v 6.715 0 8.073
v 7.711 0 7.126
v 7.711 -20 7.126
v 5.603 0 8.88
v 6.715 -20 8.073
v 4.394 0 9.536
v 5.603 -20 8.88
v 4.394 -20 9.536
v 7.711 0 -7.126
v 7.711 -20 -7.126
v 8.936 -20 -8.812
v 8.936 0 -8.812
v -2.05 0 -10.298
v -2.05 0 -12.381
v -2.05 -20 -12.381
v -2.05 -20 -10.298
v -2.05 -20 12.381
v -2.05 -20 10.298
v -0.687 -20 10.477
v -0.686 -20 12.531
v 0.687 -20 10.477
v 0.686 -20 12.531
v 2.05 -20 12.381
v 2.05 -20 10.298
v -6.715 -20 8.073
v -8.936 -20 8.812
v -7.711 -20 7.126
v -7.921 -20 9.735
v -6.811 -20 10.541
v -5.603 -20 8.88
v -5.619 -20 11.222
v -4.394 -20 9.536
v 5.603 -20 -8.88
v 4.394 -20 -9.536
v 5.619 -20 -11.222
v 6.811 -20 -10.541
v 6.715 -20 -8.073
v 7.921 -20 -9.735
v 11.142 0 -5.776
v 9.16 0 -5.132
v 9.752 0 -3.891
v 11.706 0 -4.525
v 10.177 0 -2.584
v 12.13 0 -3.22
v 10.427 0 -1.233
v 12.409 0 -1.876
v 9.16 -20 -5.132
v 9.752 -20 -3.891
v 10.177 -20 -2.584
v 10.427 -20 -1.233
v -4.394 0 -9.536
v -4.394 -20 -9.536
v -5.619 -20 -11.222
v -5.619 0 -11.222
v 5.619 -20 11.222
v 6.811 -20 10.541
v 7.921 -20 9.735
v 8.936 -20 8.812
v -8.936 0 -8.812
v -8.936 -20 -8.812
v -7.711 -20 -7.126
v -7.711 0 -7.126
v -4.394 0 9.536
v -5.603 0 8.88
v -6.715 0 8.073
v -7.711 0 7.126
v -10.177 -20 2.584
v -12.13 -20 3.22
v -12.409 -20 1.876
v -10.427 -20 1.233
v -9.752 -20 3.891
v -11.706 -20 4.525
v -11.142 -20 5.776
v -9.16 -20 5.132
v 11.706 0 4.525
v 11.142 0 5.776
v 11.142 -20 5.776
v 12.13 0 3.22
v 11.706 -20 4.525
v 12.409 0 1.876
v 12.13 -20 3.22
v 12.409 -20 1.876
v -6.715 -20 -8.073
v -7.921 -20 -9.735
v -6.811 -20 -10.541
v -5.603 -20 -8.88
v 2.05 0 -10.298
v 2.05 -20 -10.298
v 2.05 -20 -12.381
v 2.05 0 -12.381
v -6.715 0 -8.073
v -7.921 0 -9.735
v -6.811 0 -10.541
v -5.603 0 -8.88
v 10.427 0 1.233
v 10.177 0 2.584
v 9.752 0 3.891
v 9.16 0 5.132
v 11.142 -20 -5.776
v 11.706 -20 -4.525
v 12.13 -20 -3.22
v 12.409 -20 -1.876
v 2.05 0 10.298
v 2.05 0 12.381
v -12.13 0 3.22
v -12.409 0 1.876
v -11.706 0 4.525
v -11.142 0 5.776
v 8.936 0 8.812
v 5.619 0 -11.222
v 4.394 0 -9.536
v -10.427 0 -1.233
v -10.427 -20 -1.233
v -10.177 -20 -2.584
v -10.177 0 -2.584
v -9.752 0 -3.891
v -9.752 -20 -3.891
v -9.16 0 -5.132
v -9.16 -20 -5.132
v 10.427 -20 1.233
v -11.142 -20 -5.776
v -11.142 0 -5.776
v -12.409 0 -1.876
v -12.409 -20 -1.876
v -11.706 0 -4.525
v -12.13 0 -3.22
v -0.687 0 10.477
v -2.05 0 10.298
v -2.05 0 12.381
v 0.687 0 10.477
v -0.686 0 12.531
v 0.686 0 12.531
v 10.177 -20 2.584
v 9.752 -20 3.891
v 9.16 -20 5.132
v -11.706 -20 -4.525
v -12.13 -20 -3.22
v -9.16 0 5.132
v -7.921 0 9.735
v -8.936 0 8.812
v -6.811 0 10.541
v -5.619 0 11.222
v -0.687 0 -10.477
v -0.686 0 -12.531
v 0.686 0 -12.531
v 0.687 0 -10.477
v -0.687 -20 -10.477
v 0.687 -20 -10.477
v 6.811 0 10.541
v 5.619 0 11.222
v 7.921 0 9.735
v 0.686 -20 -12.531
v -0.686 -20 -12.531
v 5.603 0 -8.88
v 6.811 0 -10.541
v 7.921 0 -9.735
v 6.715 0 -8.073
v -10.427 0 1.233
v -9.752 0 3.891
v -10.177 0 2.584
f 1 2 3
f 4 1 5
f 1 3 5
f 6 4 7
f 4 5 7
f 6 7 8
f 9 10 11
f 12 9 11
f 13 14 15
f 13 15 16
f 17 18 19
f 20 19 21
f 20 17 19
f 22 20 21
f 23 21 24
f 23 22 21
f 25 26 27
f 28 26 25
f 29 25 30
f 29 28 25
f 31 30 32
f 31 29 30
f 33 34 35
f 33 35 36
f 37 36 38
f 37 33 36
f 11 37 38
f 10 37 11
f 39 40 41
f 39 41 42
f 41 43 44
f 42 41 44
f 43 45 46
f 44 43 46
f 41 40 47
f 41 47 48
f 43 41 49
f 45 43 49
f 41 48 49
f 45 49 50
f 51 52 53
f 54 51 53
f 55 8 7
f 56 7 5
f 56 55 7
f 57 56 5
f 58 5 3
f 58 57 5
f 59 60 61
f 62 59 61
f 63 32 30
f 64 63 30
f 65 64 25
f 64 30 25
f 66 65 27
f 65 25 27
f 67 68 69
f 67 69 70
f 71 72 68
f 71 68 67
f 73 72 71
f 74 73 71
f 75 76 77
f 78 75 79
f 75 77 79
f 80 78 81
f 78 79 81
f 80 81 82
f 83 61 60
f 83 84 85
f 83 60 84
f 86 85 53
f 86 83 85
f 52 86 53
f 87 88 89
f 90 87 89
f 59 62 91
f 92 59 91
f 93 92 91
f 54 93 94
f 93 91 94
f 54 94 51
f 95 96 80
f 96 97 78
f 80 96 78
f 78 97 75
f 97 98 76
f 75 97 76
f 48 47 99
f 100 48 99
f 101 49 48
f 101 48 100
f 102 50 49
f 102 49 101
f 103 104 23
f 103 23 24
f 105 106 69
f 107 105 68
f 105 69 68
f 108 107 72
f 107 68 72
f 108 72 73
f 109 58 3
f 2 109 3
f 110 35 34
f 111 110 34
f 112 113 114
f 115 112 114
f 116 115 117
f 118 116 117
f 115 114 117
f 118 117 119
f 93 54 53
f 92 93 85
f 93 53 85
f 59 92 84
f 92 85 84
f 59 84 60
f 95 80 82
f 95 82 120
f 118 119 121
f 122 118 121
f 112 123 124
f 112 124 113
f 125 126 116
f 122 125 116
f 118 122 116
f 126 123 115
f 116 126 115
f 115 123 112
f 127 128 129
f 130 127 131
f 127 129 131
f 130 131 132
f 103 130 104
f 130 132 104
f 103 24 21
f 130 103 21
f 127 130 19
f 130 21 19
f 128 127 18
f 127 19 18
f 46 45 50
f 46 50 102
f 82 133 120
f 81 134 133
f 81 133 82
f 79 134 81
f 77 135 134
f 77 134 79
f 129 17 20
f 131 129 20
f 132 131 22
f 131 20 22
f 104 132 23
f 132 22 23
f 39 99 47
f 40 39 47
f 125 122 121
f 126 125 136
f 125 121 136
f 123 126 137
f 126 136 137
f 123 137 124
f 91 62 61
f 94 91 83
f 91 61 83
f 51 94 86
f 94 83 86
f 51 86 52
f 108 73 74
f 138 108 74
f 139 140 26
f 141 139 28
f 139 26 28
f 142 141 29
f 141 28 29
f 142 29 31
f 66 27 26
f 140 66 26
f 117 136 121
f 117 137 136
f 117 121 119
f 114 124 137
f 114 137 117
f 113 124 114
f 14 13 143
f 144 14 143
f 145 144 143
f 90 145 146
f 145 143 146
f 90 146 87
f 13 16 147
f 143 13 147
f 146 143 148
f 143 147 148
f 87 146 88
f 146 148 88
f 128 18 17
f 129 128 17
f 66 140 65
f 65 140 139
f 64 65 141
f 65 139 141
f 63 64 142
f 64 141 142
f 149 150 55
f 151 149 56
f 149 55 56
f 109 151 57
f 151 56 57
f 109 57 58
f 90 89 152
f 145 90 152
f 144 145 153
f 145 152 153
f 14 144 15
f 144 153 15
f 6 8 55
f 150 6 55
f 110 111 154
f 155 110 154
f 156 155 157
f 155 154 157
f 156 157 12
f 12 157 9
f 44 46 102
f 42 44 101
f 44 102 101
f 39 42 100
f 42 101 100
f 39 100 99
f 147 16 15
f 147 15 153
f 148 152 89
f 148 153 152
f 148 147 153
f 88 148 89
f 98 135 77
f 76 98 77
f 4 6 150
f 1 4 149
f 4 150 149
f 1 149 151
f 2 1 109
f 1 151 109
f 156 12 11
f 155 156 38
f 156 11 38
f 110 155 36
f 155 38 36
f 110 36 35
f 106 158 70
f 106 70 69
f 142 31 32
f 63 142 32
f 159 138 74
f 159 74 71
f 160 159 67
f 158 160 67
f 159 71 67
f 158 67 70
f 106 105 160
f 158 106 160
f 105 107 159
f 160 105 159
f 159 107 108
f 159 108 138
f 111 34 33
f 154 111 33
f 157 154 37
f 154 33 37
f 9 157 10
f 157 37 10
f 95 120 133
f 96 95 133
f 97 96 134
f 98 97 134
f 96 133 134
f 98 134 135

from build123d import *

# Parameters (mm, degrees)
F1_DEPTH = 20
F3_DEPTH = 25


with BuildPart() as f1:
    # F0 (on Front) → F1 (new body)
    with BuildSketch(Plane.XZ):
        with BuildLine():
            ThreePointArc((48.729363, -11.200408), (49.681325, -5.636126), (50, 0))
            ThreePointArc((50, 0), (49.998301, 0.412138), (49.993206, 0.824248))
            ThreePointArc((49.993206, 0.824248), (49.726095, 5.226423), (49.072105, 9.587936))
            ThreePointArc((49.072105, 9.587936), (47.552826, 15.45085), (45.335814, 21.087057))
            ThreePointArc((45.335814, 21.087057), (43.30127, 25), (40.929834, 28.718438))
            ThreePointArc((40.929834, 28.718438), (37.157241, 33.45653), (32.839448, 37.703722))
            ThreePointArc((32.839448, 37.703722), (29.389263, 40.45085), (25.710422, 42.883262))
            ThreePointArc((25.710422, 42.883262), (20.336832, 45.677273), (14.664844, 47.801071))
            ThreePointArc((14.664844, 47.801071), (10.395585, 48.90738), (6.045446, 49.63318))
            ThreePointArc((6.045446, 49.63318), (3.028282, 49.908211), (0, 50))
            ThreePointArc((0, 50), (-3.028282, 49.908211), (-6.045446, 49.63318))
            ThreePointArc((-6.045446, 49.63318), (-10.395585, 48.90738), (-14.664844, 47.801071))
            ThreePointArc((-14.664844, 47.801071), (-20.336832, 45.677273), (-25.710422, 42.883262))
            ThreePointArc((-25.710422, 42.883262), (-29.389263, 40.45085), (-32.839448, 37.703722))
            ThreePointArc((-32.839448, 37.703722), (-37.157241, 33.45653), (-40.929834, 28.718438))
            ThreePointArc((-40.929834, 28.718438), (-43.30127, 25), (-45.335814, 21.087057))
            ThreePointArc((-45.335814, 21.087057), (-47.552826, 15.45085), (-49.072105, 9.587936))
            ThreePointArc((-49.072105, 9.587936), (-49.726095, 5.226423), (-49.993206, 0.824248))
            ThreePointArc((-49.993206, 0.824248), (-49.726095, -5.226423), (-48.729363, -11.200408))
            ThreePointArc((-48.729363, -11.200408), (-47.552826, -15.45085), (-46.006318, -19.581081))
            ThreePointArc((-46.006318, -19.581081), (-43.30127, -25), (-39.960872, -30.0521))
            ThreePointArc((-39.960872, -30.0521), (-37.157241, -33.45653), (-34.06452, -36.600663))
            ThreePointArc((-34.06452, -36.600663), (-29.389263, -40.45085), (-24.282783, -43.70751))
            ThreePointArc((-24.282783, -43.70751), (-20.336832, -45.677273), (-16.232657, -47.291657))
            ThreePointArc((-16.232657, -47.291657), (-10.395585, -48.90738), (-4.40598, -49.805495))
            ThreePointArc((-4.40598, -49.805495), (0, -50), (4.40598, -49.805495))
            ThreePointArc((4.40598, -49.805495), (10.395585, -48.90738), (16.232657, -47.291657))
            ThreePointArc((16.232657, -47.291657), (20.336832, -45.677273), (24.282783, -43.70751))
            ThreePointArc((24.282783, -43.70751), (29.389263, -40.45085), (34.06452, -36.600663))
            ThreePointArc((34.06452, -36.600663), (37.157241, -33.45653), (39.960872, -30.0521))
            ThreePointArc((39.960872, -30.0521), (43.30127, -25), (46.006318, -19.581081))
            ThreePointArc((46.006318, -19.581081), (47.552826, -15.45085), (48.729363, -11.200408))
        make_face()
        with BuildLine():
            ThreePointArc((49.993206, 0.824248), (49.998301, 0.412138), (50, 0))
            ThreePointArc((50, 0), (49.681325, -5.636126), (48.729363, -11.200408))
            ThreePointArc((48.729363, -11.200408), (54.079586, -11.415323), (59.43312, -11.311688))
            ThreePointArc((59.43312, -11.311688), (59.852825, -8.825494), (60.168575, -6.323972))
            ThreePointArc((60.168575, -6.323972), (60.379821, -3.811466), (60.486196, -1.29234))
            ThreePointArc((60.486196, -1.29234), (55.271196, -0.077907), (49.993206, 0.824248))
        make_face()
        with BuildLine():
            ThreePointArc((45.335814, 21.087057), (47.552826, 15.45085), (49.072105, 9.587936))
            ThreePointArc((49.072105, 9.587936), (54.04719, 11.567733), (58.895735, 13.839886))
            ThreePointArc((58.895735, 13.839886), (58.267928, 16.281847), (57.538919, 18.695528))
            ThreePointArc((57.538919, 18.695528), (56.709974, 21.076738), (55.782531, 23.421341))
            ThreePointArc((55.782531, 23.421341), (50.524438, 22.409649), (45.335814, 21.087057))
        make_face()
        with BuildLine():
            ThreePointArc((54.731247, -25.782563), (50.461062, -22.551992), (46.006318, -19.581081))
            ThreePointArc((46.006318, -19.581081), (43.30127, -25), (39.960872, -30.0521))
            ThreePointArc((39.960872, -30.0521), (44.76113, -32.424566), (49.693979, -34.507369))
            ThreePointArc((49.693979, -34.507369), (51.088624, -32.406827), (52.394537, -30.25))
            ThreePointArc((52.394537, -30.25), (53.609448, -28.040633), (54.731247, -25.782563))
        make_face()
        with BuildLine():
            ThreePointArc((32.839448, 37.703722), (37.157241, 33.45653), (40.929834, 28.718438))
            ThreePointArc((40.929834, 28.718438), (44.669544, 32.550622), (48.174742, 36.598419))
            ThreePointArc((48.174742, 36.598419), (46.607977, 38.573909), (44.960262, 40.482402))
            ThreePointArc((44.960262, 40.482402), (43.234457, 42.320583), (41.43356, 44.085259))
            ThreePointArc((41.43356, 44.085259), (37.041545, 41.022373), (32.839448, 37.703722))
        make_face()
        with BuildLine():
            ThreePointArc((39.512769, -45.814747), (36.925753, -41.126633), (34.06452, -36.600663))
            ThreePointArc((34.06452, -36.600663), (29.389263, -40.45085), (24.282783, -43.70751))
            ThreePointArc((24.282783, -43.70751), (27.703068, -47.827306), (31.362297, -51.736412))
            ThreePointArc((31.362297, -51.736412), (33.490737, -50.384725), (35.561008, -48.945528))
            ThreePointArc((35.561008, -48.945528), (37.569515, -47.42132), (39.512769, -45.814747))
        make_face()
        with BuildLine():
            ThreePointArc((14.664844, 47.801071), (20.336832, 45.677273), (25.710422, 42.883262))
            ThreePointArc((25.710422, 42.883262), (27.568128, 47.905214), (29.123899, 53.028752))
            ThreePointArc((29.123899, 53.028752), (26.889084, 54.196191), (24.607567, 55.2695))
            ThreePointArc((24.607567, 55.2695), (22.28331, 56.246814), (19.920351, 57.126435))
            ThreePointArc((19.920351, 57.126435), (17.153833, 52.541957), (14.664844, 47.801071))
        make_face()
        with BuildLine():
            ThreePointArc((17.462174, -57.925145), (17.005645, -52.590106), (16.232657, -47.291657))
            ThreePointArc((16.232657, -47.291657), (10.395585, -48.90738), (4.40598, -49.805495))
            ThreePointArc((4.40598, -49.805495), (5.854894, -54.960271), (7.607789, -60.01976))
            ThreePointArc((7.607789, -60.01976), (10.101996, -59.650647), (12.578657, -59.17793))
            ThreePointArc((12.578657, -59.17793), (15.033471, -58.60243), (17.462174, -57.925145))
        make_face()
        with BuildLine():
            ThreePointArc((0, 50), (3.028282, 49.908211), (6.045446, 49.63318))
            ThreePointArc((6.045446, 49.63318), (5.699933, 54.976558), (5.037269, 60.289932))
            ThreePointArc((5.037269, 60.289932), (2.520824, 60.44746), (0, 60.5))
            Line((0, 60.5), (0, 50))
        make_face()
        with BuildLine():
            ThreePointArc((-7.607789, -60.01976), (-5.854894, -54.960271), (-4.40598, -49.805495))
            ThreePointArc((-4.40598, -49.805495), (-10.395585, -48.90738), (-16.232657, -47.291657))
            ThreePointArc((-16.232657, -47.291657), (-17.005645, -52.590106), (-17.462174, -57.925145))
            ThreePointArc((-17.462174, -57.925145), (-15.033471, -58.60243), (-12.578657, -59.17793))
            ThreePointArc((-12.578657, -59.17793), (-10.101996, -59.650647), (-7.607789, -60.01976))
        make_face()
        with BuildLine():
            ThreePointArc((-6.045446, 49.63318), (-3.028282, 49.908211), (0, 50))
            Line((0, 50), (0, 60.5))
            ThreePointArc((0, 60.5), (-2.520824, 60.44746), (-5.037269, 60.289932))
            ThreePointArc((-5.037269, 60.289932), (-5.699933, 54.976558), (-6.045446, 49.63318))
        make_face()
        with BuildLine():
            ThreePointArc((-31.362297, -51.736412), (-27.703068, -47.827306), (-24.282783, -43.70751))
            ThreePointArc((-24.282783, -43.70751), (-29.389263, -40.45085), (-34.06452, -36.600663))
            ThreePointArc((-34.06452, -36.600663), (-36.925753, -41.126633), (-39.512769, -45.814747))
            ThreePointArc((-39.512769, -45.814747), (-37.569515, -47.42132), (-35.561008, -48.945528))
            ThreePointArc((-35.561008, -48.945528), (-33.490737, -50.384725), (-31.362297, -51.736412))
        make_face()
        with BuildLine():
            ThreePointArc((-25.710422, 42.883262), (-20.336832, 45.677273), (-14.664844, 47.801071))
            ThreePointArc((-14.664844, 47.801071), (-17.153833, 52.541957), (-19.920351, 57.126435))
            ThreePointArc((-19.920351, 57.126435), (-22.28331, 56.246814), (-24.607567, 55.2695))
            ThreePointArc((-24.607567, 55.2695), (-26.889084, 54.196191), (-29.123899, 53.028752))
            ThreePointArc((-29.123899, 53.028752), (-27.568128, 47.905214), (-25.710422, 42.883262))
        make_face()
        with BuildLine():
            ThreePointArc((-49.693979, -34.507369), (-44.76113, -32.424566), (-39.960872, -30.0521))
            ThreePointArc((-39.960872, -30.0521), (-43.30127, -25), (-46.006318, -19.581081))
            ThreePointArc((-46.006318, -19.581081), (-50.461062, -22.551992), (-54.731247, -25.782563))
            ThreePointArc((-54.731247, -25.782563), (-53.609448, -28.040633), (-52.394537, -30.25))
            ThreePointArc((-52.394537, -30.25), (-51.088624, -32.406827), (-49.693979, -34.507369))
        make_face()
        with BuildLine():
            ThreePointArc((-40.929834, 28.718438), (-37.157241, 33.45653), (-32.839448, 37.703722))
            ThreePointArc((-32.839448, 37.703722), (-37.041545, 41.022373), (-41.43356, 44.085259))
            ThreePointArc((-41.43356, 44.085259), (-43.234457, 42.320583), (-44.960262, 40.482402))
            ThreePointArc((-44.960262, 40.482402), (-46.607977, 38.573909), (-48.174742, 36.598419))
            ThreePointArc((-48.174742, 36.598419), (-44.669544, 32.550622), (-40.929834, 28.718438))
        make_face()
        with BuildLine():
            ThreePointArc((-59.43312, -11.311688), (-54.079586, -11.415323), (-48.729363, -11.200408))
            ThreePointArc((-48.729363, -11.200408), (-49.726095, -5.226423), (-49.993206, 0.824248))
            ThreePointArc((-49.993206, 0.824248), (-55.271196, -0.077907), (-60.486196, -1.29234))
            ThreePointArc((-60.486196, -1.29234), (-60.379821, -3.811466), (-60.168575, -6.323972))
            ThreePointArc((-60.168575, -6.323972), (-59.852825, -8.825494), (-59.43312, -11.311688))
        make_face()
        with BuildLine():
            ThreePointArc((-49.072105, 9.587936), (-47.552826, 15.45085), (-45.335814, 21.087057))
            ThreePointArc((-45.335814, 21.087057), (-50.524438, 22.409649), (-55.782531, 23.421341))
            ThreePointArc((-55.782531, 23.421341), (-56.709974, 21.076738), (-57.538919, 18.695528))
            ThreePointArc((-57.538919, 18.695528), (-58.267928, 16.281847), (-58.895735, 13.839886))
            ThreePointArc((-58.895735, 13.839886), (-54.04719, 11.567733), (-49.072105, 9.587936))
        make_face()
    extrude(amount=F1_DEPTH)

    # F2 (on face) → F3 (cut)
    with BuildSketch(Plane.XZ.offset(20)):
        with BuildLine():
            ThreePointArc((54.731247, -25.782563), (50.461062, -22.551992), (46.006318, -19.581081))
            ThreePointArc((46.006318, -19.581081), (47.552826, -15.45085), (48.729363, -11.200408))
            ThreePointArc((48.729363, -11.200408), (54.079586, -11.415323), (59.43312, -11.311688))
            ThreePointArc((59.43312, -11.311688), (60.168575, -6.323972), (60.486196, -1.29234))
            ThreePointArc((60.486196, -1.29234), (55.271196, -0.077907), (49.993206, 0.824248))
            ThreePointArc((49.993206, 0.824248), (49.726095, 5.226423), (49.072105, 9.587936))
            ThreePointArc((49.072105, 9.587936), (54.04719, 11.567733), (58.895735, 13.839886))
            ThreePointArc((58.895735, 13.839886), (57.538919, 18.695528), (55.782531, 23.421341))
            ThreePointArc((55.782531, 23.421341), (50.524438, 22.409649), (45.335814, 21.087057))
            ThreePointArc((45.335814, 21.087057), (43.30127, 25), (40.929834, 28.718438))
            ThreePointArc((40.929834, 28.718438), (44.669544, 32.550622), (48.174742, 36.598419))
            ThreePointArc((48.174742, 36.598419), (44.960262, 40.482402), (41.43356, 44.085259))
            ThreePointArc((41.43356, 44.085259), (37.041545, 41.022373), (32.839448, 37.703722))
            ThreePointArc((32.839448, 37.703722), (29.389263, 40.45085), (25.710422, 42.883262))
            ThreePointArc((25.710422, 42.883262), (27.568128, 47.905214), (29.123899, 53.028752))
            ThreePointArc((29.123899, 53.028752), (24.607567, 55.2695), (19.920351, 57.126435))
            ThreePointArc((19.920351, 57.126435), (17.153833, 52.541957), (14.664844, 47.801071))
            ThreePointArc((14.664844, 47.801071), (10.395585, 48.90738), (6.045446, 49.63318))
            ThreePointArc((6.045446, 49.63318), (5.699933, 54.976558), (5.037269, 60.289932))
            ThreePointArc((5.037269, 60.289932), (0, 60.5), (-5.037269, 60.289932))
            ThreePointArc((-5.037269, 60.289932), (-5.699933, 54.976558), (-6.045446, 49.63318))
            ThreePointArc((-6.045446, 49.63318), (-10.395585, 48.90738), (-14.664844, 47.801071))
            ThreePointArc((-14.664844, 47.801071), (-17.153833, 52.541957), (-19.920351, 57.126435))
            ThreePointArc((-19.920351, 57.126435), (-24.607567, 55.2695), (-29.123899, 53.028752))
            ThreePointArc((-29.123899, 53.028752), (-27.568128, 47.905214), (-25.710422, 42.883262))
            ThreePointArc((-25.710422, 42.883262), (-29.389263, 40.45085), (-32.839448, 37.703722))
            ThreePointArc((-32.839448, 37.703722), (-37.041545, 41.022373), (-41.43356, 44.085259))
            ThreePointArc((-41.43356, 44.085259), (-44.960262, 40.482402), (-48.174742, 36.598419))
            ThreePointArc((-48.174742, 36.598419), (-44.669544, 32.550622), (-40.929834, 28.718438))
            ThreePointArc((-40.929834, 28.718438), (-43.30127, 25), (-45.335814, 21.087057))
            ThreePointArc((-45.335814, 21.087057), (-50.524438, 22.409649), (-55.782531, 23.421341))
            ThreePointArc((-55.782531, 23.421341), (-57.538919, 18.695528), (-58.895735, 13.839886))
            ThreePointArc((-58.895735, 13.839886), (-54.04719, 11.567733), (-49.072105, 9.587936))
            ThreePointArc((-49.072105, 9.587936), (-49.726095, 5.226423), (-49.993206, 0.824248))
            ThreePointArc((-49.993206, 0.824248), (-55.271196, -0.077907), (-60.486196, -1.29234))
            ThreePointArc((-60.486196, -1.29234), (-60.168575, -6.323972), (-59.43312, -11.311688))
            ThreePointArc((-59.43312, -11.311688), (-54.079586, -11.415323), (-48.729363, -11.200408))
            ThreePointArc((-48.729363, -11.200408), (-47.552826, -15.45085), (-46.006318, -19.581081))
            ThreePointArc((-46.006318, -19.581081), (-50.461062, -22.551992), (-54.731247, -25.782563))
            ThreePointArc((-54.731247, -25.782563), (-52.394537, -30.25), (-49.693979, -34.507369))
            ThreePointArc((-49.693979, -34.507369), (-44.76113, -32.424566), (-39.960872, -30.0521))
            ThreePointArc((-39.960872, -30.0521), (-37.157241, -33.45653), (-34.06452, -36.600663))
            ThreePointArc((-34.06452, -36.600663), (-36.925753, -41.126633), (-39.512769, -45.814747))
            ThreePointArc((-39.512769, -45.814747), (-35.561008, -48.945528), (-31.362297, -51.736412))
            ThreePointArc((-31.362297, -51.736412), (-27.703068, -47.827306), (-24.282783, -43.70751))
            ThreePointArc((-24.282783, -43.70751), (-20.336832, -45.677273), (-16.232657, -47.291657))
            ThreePointArc((-16.232657, -47.291657), (-17.005645, -52.590106), (-17.462174, -57.925145))
            ThreePointArc((-17.462174, -57.925145), (-12.578657, -59.17793), (-7.607789, -60.01976))
            ThreePointArc((-7.607789, -60.01976), (-5.854894, -54.960271), (-4.40598, -49.805495))
            ThreePointArc((-4.40598, -49.805495), (0, -50), (4.40598, -49.805495))
            ThreePointArc((4.40598, -49.805495), (5.854894, -54.960271), (7.607789, -60.01976))
            ThreePointArc((7.607789, -60.01976), (12.578657, -59.17793), (17.462174, -57.925145))
            ThreePointArc((17.462174, -57.925145), (17.005645, -52.590106), (16.232657, -47.291657))
            ThreePointArc((16.232657, -47.291657), (20.336832, -45.677273), (24.282783, -43.70751))
            ThreePointArc((24.282783, -43.70751), (27.703068, -47.827306), (31.362297, -51.736412))
            ThreePointArc((31.362297, -51.736412), (35.561008, -48.945528), (39.512769, -45.814747))
            ThreePointArc((39.512769, -45.814747), (36.925753, -41.126633), (34.06452, -36.600663))
            ThreePointArc((34.06452, -36.600663), (37.157241, -33.45653), (39.960872, -30.0521))
            ThreePointArc((39.960872, -30.0521), (44.76113, -32.424566), (49.693979, -34.507369))
            ThreePointArc((49.693979, -34.507369), (52.394537, -30.25), (54.731247, -25.782563))
        make_face()
        with BuildLine():
            ThreePointArc((-2.05, 12.381438), (0, 12.55), (2.05, 12.381438))
            Line((2.05, 12.381438), (2.05, 10.297937))
            ThreePointArc((2.05, 10.297937), (3.244678, 9.986093), (4.39449, 9.536166))
            Line((4.39449, 9.536166), (5.619142, 11.221753))
            ThreePointArc((5.619142, 11.221753), (7.376705, 10.153163), (8.936111, 8.811834))
            Line((8.936111, 8.811834), (7.71146, 7.126246))
            ThreePointArc((7.71146, 7.126246), (8.494678, 6.171745), (9.160435, 5.131903))
            Line((9.160435, 5.131903), (11.141962, 5.775741))
            ThreePointArc((11.141962, 5.775741), (11.935759, 3.878163), (12.408932, 1.876409))
            Line((12.408932, 1.876409), (10.427405, 1.232572))
            ThreePointArc((10.427405, 1.232572), (10.481835, 0.617354), (10.5, 0))
            ThreePointArc((10.5, 0), (10.481835, -0.617354), (10.427405, -1.232572))
            Line((10.427405, -1.232572), (12.408932, -1.876409))
            ThreePointArc((12.408932, -1.876409), (11.935759, -3.878163), (11.141962, -5.775741))
            Line((11.141962, -5.775741), (9.160435, -5.131903))
            ThreePointArc((9.160435, -5.131903), (8.494678, -6.171745), (7.71146, -7.126246))
            Line((7.71146, -7.126246), (8.936111, -8.811834))
            ThreePointArc((8.936111, -8.811834), (7.376705, -10.153163), (5.619142, -11.221753))
            Line((5.619142, -11.221753), (4.39449, -9.536166))
            ThreePointArc((4.39449, -9.536166), (3.244678, -9.986093), (2.05, -10.297937))
            Line((2.05, -10.297937), (2.05, -12.381438))
            ThreePointArc((2.05, -12.381438), (0, -12.55), (-2.05, -12.381438))
            Line((-2.05, -12.381438), (-2.05, -10.297937))
            ThreePointArc((-2.05, -10.297937), (-3.244678, -9.986093), (-4.39449, -9.536166))
            Line((-4.39449, -9.536166), (-5.619142, -11.221753))
            ThreePointArc((-5.619142, -11.221753), (-7.376705, -10.153163), (-8.936111, -8.811834))
            Line((-8.936111, -8.811834), (-7.71146, -7.126246))
            ThreePointArc((-7.71146, -7.126246), (-8.494678, -6.171745), (-9.160435, -5.131903))
            Line((-9.160435, -5.131903), (-11.141962, -5.775741))
            ThreePointArc((-11.141962, -5.775741), (-11.935759, -3.878163), (-12.408932, -1.876409))
            Line((-12.408932, -1.876409), (-10.427405, -1.232572))
            ThreePointArc((-10.427405, -1.232572), (-10.5, 0), (-10.427405, 1.232572))
            Line((-10.427405, 1.232572), (-12.408932, 1.876409))
            ThreePointArc((-12.408932, 1.876409), (-11.935759, 3.878163), (-11.141962, 5.775741))
            Line((-11.141962, 5.775741), (-9.160435, 5.131903))
            ThreePointArc((-9.160435, 5.131903), (-8.494678, 6.171745), (-7.71146, 7.126246))
            Line((-7.71146, 7.126246), (-8.936111, 8.811834))
            ThreePointArc((-8.936111, 8.811834), (-7.376705, 10.153163), (-5.619142, 11.221753))
            Line((-5.619142, 11.221753), (-4.39449, 9.536166))
            ThreePointArc((-4.39449, 9.536166), (-3.244678, 9.986093), (-2.05, 10.297937))
            Line((-2.05, 10.297937), (-2.05, 12.381438))
        make_face(mode=Mode.SUBTRACT)
        with BuildLine():
            ThreePointArc((4.39449, 9.536166), (3.244678, 9.986093), (2.05, 10.297937))
            ThreePointArc((2.05, 10.297937), (0, 10.5), (-2.05, 10.297937))
            ThreePointArc((-2.05, 10.297937), (-3.244678, 9.986093), (-4.39449, 9.536166))
            ThreePointArc((-4.39449, 9.536166), (-6.171745, 8.494678), (-7.71146, 7.126246))
            ThreePointArc((-7.71146, 7.126246), (-8.494678, 6.171745), (-9.160435, 5.131903))
            ThreePointArc((-9.160435, 5.131903), (-9.986093, 3.244678), (-10.427405, 1.232572))
            ThreePointArc((-10.427405, 1.232572), (-10.5, 0), (-10.427405, -1.232572))
            ThreePointArc((-10.427405, -1.232572), (-9.986093, -3.244678), (-9.160435, -5.131903))
            ThreePointArc((-9.160435, -5.131903), (-8.494678, -6.171745), (-7.71146, -7.126246))
            ThreePointArc((-7.71146, -7.126246), (-6.171745, -8.494678), (-4.39449, -9.536166))
            ThreePointArc((-4.39449, -9.536166), (-3.244678, -9.986093), (-2.05, -10.297937))
            ThreePointArc((-2.05, -10.297937), (0, -10.5), (2.05, -10.297937))
            ThreePointArc((2.05, -10.297937), (3.244678, -9.986093), (4.39449, -9.536166))
            ThreePointArc((4.39449, -9.536166), (6.171745, -8.494678), (7.71146, -7.126246))
            ThreePointArc((7.71146, -7.126246), (8.494678, -6.171745), (9.160435, -5.131903))
            ThreePointArc((9.160435, -5.131903), (9.986093, -3.244678), (10.427405, -1.232572))
            ThreePointArc((10.427405, -1.232572), (10.481835, -0.617354), (10.5, 0))
            ThreePointArc((10.5, 0), (10.481835, 0.617354), (10.427405, 1.232572))
            ThreePointArc((10.427405, 1.232572), (9.986093, 3.244678), (9.160435, 5.131903))
            ThreePointArc((9.160435, 5.131903), (8.494678, 6.171745), (7.71146, 7.126246))
            ThreePointArc((7.71146, 7.126246), (6.171745, 8.494678), (4.39449, 9.536166))
        make_face()
    extrude(amount=-F3_DEPTH, mode=Mode.SUBTRACT)


solid = f1.part
